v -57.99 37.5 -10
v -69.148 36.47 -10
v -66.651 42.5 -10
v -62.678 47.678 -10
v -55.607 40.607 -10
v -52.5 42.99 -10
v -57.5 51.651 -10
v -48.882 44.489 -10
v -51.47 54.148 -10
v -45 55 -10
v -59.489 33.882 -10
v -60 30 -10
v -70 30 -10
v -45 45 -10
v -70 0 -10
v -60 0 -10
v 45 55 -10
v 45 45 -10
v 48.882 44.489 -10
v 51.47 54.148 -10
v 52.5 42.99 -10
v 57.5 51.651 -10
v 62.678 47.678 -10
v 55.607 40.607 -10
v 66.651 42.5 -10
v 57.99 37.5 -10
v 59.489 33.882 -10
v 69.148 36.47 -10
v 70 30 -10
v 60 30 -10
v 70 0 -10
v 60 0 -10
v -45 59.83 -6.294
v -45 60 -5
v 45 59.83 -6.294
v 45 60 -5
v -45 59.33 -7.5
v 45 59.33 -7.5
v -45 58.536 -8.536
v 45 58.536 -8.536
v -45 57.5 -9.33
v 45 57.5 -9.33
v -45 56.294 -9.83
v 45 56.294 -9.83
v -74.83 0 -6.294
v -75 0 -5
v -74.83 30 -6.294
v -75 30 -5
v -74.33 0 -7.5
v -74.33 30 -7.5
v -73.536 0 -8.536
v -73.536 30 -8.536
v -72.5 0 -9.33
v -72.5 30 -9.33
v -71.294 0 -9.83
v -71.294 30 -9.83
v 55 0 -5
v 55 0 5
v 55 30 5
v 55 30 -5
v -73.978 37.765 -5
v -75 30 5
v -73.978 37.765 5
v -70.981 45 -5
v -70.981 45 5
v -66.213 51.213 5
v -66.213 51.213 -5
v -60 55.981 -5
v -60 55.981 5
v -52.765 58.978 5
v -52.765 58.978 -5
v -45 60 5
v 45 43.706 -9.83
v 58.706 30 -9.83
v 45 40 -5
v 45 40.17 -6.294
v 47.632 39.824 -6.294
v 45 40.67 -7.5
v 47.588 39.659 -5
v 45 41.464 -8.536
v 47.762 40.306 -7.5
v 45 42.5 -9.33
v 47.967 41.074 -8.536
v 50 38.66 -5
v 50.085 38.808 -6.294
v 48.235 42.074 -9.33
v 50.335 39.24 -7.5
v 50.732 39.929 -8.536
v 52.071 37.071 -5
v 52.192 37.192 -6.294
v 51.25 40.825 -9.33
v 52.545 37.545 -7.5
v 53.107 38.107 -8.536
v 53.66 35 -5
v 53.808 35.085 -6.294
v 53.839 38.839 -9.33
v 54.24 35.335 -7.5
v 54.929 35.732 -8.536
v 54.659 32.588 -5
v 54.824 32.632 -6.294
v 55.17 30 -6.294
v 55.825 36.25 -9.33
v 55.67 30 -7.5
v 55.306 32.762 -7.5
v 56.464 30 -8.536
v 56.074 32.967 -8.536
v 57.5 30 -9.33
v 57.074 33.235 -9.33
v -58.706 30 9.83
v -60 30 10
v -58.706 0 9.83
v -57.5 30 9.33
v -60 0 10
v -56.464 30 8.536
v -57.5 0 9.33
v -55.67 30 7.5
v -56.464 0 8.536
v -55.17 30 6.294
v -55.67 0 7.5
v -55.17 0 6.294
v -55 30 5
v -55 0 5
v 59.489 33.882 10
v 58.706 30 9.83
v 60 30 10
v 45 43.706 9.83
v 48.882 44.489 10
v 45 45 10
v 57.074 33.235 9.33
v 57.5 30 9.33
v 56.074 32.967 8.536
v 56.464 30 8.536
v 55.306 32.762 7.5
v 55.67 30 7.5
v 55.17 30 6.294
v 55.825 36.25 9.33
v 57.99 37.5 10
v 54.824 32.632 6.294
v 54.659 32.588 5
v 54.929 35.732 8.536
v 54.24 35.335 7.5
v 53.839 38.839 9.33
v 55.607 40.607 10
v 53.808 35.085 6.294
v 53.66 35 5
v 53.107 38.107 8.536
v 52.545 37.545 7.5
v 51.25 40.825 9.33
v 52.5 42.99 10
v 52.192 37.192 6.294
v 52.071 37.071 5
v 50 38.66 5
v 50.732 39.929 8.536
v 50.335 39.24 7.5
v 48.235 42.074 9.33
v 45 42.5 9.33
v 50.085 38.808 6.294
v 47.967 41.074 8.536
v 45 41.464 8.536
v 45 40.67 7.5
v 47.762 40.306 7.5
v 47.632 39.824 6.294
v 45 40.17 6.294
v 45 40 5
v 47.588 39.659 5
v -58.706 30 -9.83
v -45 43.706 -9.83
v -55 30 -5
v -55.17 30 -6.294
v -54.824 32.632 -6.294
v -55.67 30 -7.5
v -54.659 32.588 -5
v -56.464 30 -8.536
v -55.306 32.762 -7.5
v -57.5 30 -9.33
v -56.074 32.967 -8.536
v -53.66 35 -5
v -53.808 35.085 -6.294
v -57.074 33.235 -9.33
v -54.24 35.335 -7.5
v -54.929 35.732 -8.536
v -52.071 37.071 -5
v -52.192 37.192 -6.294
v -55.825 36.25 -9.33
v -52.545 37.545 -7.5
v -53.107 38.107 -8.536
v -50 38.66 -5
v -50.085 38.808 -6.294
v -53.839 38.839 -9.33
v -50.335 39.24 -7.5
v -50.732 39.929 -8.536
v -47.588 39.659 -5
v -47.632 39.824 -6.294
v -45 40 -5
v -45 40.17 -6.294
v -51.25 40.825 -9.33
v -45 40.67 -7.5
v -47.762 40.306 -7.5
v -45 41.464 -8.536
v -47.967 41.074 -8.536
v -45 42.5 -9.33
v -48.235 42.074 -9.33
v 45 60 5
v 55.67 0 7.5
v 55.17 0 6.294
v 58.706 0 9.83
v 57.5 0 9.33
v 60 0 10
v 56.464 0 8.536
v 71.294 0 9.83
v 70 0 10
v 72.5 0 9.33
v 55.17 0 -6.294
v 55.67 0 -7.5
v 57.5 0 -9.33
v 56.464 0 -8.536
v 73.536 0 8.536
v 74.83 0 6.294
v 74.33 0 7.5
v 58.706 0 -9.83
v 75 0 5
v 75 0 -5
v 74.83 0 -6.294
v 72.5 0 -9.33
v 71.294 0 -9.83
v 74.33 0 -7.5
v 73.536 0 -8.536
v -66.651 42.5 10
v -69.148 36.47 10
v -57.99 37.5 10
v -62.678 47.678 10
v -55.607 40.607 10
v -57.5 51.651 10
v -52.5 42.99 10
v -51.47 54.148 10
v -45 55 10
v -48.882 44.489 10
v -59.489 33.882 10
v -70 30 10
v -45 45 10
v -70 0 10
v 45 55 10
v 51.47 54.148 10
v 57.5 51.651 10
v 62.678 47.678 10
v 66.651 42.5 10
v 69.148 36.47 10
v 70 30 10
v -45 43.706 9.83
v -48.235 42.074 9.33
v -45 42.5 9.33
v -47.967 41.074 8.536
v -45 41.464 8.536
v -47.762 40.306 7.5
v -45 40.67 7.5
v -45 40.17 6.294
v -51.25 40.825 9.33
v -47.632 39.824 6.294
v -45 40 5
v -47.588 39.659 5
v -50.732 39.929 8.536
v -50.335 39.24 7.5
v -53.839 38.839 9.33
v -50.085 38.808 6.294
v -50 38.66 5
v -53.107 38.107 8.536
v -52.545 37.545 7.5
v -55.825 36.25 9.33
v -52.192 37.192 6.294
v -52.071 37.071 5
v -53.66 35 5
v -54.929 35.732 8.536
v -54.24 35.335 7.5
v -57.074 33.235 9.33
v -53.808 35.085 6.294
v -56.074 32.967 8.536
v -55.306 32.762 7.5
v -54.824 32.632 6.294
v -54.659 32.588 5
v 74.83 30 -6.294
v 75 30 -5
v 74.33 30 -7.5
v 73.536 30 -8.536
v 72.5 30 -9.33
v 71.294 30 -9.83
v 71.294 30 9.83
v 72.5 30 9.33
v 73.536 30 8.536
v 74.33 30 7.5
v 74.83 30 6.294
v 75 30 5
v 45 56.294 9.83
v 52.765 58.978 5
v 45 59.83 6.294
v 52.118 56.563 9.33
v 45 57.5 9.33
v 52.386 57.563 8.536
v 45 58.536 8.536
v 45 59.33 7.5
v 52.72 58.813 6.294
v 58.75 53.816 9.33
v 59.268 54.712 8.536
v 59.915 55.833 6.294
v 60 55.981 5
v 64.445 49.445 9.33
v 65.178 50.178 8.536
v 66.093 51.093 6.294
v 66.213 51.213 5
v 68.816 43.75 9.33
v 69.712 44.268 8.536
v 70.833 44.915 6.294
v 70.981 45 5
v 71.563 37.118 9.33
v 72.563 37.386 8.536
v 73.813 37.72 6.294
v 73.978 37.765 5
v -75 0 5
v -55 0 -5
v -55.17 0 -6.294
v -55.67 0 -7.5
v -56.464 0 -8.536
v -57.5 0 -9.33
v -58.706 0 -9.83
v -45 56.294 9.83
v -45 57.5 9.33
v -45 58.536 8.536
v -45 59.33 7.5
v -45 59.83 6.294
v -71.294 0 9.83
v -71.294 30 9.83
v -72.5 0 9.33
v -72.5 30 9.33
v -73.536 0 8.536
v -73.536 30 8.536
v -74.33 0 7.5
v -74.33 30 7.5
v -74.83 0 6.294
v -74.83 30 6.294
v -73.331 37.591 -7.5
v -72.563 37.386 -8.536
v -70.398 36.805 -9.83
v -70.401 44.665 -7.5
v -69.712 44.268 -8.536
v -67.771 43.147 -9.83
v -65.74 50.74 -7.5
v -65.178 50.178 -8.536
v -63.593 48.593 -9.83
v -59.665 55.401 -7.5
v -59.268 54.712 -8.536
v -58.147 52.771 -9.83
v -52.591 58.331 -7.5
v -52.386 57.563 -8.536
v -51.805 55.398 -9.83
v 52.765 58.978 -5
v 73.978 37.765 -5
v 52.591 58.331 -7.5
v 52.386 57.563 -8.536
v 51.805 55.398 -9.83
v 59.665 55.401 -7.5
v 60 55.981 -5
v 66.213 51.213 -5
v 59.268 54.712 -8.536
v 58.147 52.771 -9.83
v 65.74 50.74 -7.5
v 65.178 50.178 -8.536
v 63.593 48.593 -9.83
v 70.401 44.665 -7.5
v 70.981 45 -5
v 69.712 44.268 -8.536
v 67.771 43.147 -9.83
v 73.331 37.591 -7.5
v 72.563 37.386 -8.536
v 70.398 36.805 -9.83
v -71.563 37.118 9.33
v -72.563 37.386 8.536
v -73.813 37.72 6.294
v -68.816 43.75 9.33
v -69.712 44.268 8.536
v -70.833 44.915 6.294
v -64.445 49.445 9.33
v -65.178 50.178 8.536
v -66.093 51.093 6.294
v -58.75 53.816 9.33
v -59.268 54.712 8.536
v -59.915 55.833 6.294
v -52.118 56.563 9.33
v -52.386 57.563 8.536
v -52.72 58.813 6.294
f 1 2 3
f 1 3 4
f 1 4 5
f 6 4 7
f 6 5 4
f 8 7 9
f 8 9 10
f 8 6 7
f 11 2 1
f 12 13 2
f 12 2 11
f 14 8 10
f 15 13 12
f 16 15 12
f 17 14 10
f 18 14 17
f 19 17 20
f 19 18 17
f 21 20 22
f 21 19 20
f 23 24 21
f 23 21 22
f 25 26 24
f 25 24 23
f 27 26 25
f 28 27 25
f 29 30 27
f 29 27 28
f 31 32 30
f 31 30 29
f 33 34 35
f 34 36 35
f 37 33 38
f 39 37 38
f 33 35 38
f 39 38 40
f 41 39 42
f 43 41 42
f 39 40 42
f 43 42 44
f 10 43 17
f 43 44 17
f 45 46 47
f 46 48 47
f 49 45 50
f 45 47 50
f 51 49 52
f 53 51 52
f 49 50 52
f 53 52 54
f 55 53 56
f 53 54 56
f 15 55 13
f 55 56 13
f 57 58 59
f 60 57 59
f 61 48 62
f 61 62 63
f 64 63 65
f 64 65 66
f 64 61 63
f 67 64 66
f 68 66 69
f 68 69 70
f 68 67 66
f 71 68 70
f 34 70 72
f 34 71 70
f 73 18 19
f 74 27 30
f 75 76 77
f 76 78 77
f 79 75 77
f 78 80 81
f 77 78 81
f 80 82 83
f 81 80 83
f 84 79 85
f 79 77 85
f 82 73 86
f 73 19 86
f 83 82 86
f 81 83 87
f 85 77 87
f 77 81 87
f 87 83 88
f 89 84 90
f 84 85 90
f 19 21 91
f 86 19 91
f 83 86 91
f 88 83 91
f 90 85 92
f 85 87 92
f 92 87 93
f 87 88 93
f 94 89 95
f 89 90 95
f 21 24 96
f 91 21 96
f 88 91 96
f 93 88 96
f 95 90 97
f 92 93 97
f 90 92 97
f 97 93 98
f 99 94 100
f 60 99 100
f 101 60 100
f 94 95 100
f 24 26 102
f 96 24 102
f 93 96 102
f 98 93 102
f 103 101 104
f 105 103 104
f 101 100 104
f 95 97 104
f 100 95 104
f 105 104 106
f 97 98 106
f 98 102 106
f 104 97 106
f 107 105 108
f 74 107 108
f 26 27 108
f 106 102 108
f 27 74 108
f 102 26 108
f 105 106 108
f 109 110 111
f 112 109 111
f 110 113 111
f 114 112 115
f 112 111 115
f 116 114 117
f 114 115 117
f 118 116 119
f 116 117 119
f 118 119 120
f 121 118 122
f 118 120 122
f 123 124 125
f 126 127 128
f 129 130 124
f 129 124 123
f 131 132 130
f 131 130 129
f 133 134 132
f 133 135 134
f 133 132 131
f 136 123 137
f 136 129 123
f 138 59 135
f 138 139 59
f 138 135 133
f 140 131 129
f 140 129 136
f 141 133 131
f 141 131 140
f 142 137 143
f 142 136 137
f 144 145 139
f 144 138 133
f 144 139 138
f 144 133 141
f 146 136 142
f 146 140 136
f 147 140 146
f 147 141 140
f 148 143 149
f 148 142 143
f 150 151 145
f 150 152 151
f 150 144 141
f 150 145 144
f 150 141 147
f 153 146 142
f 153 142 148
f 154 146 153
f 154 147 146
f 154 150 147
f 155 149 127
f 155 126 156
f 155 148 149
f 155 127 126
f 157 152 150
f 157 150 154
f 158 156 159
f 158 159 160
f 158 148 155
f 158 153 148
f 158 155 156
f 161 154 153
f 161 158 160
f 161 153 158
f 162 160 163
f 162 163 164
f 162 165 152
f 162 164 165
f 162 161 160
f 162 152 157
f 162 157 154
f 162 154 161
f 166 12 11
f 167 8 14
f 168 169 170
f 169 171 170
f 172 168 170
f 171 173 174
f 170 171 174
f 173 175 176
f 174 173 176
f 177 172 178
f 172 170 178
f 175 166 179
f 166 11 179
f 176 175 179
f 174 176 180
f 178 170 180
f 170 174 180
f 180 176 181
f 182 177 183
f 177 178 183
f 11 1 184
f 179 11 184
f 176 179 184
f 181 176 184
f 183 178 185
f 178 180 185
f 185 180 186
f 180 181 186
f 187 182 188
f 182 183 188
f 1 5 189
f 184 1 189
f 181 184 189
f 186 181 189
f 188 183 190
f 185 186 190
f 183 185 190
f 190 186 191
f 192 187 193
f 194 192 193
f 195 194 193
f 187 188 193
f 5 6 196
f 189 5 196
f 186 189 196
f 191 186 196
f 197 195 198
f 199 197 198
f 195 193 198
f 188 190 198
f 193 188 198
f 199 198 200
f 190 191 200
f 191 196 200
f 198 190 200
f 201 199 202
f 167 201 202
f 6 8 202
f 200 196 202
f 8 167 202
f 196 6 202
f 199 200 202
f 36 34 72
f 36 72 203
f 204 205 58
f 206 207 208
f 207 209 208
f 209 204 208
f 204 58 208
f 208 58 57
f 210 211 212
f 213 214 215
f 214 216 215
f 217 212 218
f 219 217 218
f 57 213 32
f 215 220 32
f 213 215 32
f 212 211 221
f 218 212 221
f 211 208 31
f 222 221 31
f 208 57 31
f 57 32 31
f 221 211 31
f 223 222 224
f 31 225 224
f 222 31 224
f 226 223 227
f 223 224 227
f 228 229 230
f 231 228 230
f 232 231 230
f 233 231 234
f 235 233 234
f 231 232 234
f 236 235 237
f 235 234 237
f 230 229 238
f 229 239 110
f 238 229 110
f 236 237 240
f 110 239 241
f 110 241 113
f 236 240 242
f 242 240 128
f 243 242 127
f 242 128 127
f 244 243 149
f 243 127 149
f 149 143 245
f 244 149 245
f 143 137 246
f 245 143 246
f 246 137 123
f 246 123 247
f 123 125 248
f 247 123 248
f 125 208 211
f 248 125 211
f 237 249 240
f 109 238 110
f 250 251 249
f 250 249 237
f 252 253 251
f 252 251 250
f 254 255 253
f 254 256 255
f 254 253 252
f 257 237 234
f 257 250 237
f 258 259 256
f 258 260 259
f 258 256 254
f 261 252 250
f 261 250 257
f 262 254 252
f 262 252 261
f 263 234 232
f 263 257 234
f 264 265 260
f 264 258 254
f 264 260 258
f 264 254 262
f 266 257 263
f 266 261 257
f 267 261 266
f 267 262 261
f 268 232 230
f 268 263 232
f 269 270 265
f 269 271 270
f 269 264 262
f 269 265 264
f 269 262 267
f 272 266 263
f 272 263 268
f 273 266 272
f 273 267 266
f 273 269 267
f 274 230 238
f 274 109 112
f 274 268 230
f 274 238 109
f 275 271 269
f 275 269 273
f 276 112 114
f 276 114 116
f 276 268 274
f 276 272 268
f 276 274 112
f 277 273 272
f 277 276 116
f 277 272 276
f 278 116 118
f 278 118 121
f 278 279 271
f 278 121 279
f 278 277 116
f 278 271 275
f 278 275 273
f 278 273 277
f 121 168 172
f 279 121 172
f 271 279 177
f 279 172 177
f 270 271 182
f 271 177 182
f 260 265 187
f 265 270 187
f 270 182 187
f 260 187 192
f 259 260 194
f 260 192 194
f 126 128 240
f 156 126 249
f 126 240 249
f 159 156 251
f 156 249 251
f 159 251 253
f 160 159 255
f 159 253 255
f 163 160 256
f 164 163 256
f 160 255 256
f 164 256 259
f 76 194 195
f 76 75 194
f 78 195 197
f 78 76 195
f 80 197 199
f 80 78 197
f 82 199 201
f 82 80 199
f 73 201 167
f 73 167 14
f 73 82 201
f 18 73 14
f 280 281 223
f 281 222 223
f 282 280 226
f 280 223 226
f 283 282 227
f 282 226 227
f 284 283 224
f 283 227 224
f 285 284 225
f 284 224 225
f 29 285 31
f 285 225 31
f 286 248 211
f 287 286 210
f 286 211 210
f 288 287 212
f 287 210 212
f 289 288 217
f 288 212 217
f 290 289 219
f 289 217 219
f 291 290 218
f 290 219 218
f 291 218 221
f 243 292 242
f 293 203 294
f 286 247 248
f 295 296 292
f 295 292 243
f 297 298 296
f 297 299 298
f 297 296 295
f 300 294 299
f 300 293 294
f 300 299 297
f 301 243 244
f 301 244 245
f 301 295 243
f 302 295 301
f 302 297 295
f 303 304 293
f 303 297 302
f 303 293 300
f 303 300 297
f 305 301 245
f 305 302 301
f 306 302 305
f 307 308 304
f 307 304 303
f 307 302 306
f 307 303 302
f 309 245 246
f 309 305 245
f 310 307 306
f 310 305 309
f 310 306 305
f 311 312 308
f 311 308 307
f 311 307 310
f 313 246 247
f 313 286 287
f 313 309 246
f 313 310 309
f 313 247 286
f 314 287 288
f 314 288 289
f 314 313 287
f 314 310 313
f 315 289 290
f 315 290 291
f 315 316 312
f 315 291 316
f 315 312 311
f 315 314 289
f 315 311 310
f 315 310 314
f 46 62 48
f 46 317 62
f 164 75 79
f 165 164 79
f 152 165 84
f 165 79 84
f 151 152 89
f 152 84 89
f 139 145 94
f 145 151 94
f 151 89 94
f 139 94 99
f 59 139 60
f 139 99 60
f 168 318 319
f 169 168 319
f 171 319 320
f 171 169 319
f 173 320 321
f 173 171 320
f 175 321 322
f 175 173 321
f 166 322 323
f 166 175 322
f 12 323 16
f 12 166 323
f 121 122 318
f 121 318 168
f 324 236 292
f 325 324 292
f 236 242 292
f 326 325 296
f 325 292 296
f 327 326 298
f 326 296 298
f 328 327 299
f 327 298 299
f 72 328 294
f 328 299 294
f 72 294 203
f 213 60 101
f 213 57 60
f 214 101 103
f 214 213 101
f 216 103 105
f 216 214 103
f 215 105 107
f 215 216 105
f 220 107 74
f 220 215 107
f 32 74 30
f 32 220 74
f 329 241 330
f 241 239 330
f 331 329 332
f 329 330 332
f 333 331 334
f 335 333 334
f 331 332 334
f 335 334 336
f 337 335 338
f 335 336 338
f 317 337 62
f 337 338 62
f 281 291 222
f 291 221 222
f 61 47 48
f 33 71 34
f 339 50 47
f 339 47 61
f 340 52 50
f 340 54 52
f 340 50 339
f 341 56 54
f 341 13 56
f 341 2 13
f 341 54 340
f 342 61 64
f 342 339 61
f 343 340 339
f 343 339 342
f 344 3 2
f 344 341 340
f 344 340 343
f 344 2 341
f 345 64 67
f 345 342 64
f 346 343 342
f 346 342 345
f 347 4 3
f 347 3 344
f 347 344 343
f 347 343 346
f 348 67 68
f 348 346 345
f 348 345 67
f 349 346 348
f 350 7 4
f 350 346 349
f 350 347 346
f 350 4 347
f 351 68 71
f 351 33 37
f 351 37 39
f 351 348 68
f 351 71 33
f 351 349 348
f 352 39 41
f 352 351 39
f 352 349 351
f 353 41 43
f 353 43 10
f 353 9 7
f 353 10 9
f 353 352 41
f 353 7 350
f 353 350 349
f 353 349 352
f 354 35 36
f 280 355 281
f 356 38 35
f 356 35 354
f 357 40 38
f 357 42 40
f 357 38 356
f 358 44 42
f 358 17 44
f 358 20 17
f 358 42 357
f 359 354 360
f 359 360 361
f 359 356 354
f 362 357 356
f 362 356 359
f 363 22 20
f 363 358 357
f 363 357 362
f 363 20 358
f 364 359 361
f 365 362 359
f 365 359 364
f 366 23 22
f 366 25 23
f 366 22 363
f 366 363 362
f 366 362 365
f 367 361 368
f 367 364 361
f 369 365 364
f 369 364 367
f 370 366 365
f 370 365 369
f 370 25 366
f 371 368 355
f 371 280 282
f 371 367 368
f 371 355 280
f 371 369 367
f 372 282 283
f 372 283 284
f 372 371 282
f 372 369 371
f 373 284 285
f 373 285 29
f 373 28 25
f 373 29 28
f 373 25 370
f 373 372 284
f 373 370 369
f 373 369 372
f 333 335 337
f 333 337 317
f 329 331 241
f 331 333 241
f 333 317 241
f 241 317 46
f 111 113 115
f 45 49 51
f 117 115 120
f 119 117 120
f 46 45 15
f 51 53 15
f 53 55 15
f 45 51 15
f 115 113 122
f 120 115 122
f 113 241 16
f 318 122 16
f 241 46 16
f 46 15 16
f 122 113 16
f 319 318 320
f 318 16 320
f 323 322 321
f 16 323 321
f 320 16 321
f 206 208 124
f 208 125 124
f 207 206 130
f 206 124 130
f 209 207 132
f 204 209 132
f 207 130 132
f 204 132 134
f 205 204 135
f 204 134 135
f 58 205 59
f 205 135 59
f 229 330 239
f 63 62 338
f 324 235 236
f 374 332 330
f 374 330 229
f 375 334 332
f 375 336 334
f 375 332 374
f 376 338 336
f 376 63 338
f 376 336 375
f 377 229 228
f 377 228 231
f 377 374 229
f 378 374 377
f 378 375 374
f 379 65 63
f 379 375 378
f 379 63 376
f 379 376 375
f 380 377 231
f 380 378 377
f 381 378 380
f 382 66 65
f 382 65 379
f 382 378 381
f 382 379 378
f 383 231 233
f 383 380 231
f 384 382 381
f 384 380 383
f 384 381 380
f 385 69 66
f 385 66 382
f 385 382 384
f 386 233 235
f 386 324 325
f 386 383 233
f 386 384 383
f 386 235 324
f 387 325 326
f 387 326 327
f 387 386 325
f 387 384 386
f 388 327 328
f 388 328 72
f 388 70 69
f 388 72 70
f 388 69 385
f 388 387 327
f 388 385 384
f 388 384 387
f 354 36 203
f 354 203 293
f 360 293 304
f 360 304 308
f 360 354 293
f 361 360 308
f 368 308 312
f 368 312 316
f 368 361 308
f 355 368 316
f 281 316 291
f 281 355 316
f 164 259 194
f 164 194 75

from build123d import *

# Parameters (mm, degrees)
SKICA1_W                 = 150
SKICA1_H                 = 20
P_IDAT_VYSUNUT_M1_DEPTH  = 60
SKICA2_W                 = 110
SKICA2_H                 = 40
ODEBRAT_VYSUNUT_M1_DEPTH = 60
ZAOBLIT1_R               = 10
ZAOBLIT2_R               = 30
ZAOBLIT3_R               = 5


with BuildPart() as part:
    # Skica1 → Přidat vysunutím1 (new body)
    with BuildSketch(Plane(origin=(0, 0, 0), x_dir=(1, 0, 0), z_dir=(0, 1, 0))):
        Rectangle(SKICA1_W, SKICA1_H)
    extrude(amount=P_IDAT_VYSUNUT_M1_DEPTH)

    # Skica2 → Odebrat vysunutím1 (cut)
    with BuildSketch(Plane.XY.offset(10)):
        with Locations((0, 20)):
            Rectangle(SKICA2_W, SKICA2_H)
    extrude(amount=-ODEBRAT_VYSUNUT_M1_DEPTH, mode=Mode.SUBTRACT)

    # Zaoblit1
    zaoblit1_edges = [part.edges().sort_by_distance(p)[0] for p in [
        (-55, 40, 0),
        (55, 40, 0),
    ]]
    fillet(zaoblit1_edges, radius=ZAOBLIT1_R)

    # Zaoblit2
    zaoblit2_edges = [part.edges().sort_by_distance(p)[0] for p in [
        (75, 60, 0),
        (-75, 60, 0),
    ]]
    fillet(zaoblit2_edges, radius=ZAOBLIT2_R)

    # Zaoblit3
    zaoblit3_edges = [part.edges().sort_by_distance(p)[0] for p in [
        (55, 15, -10),
        (55, 15, 10),
        (0, 40, 10),
        (0, 40, -10),
        (-55, 15, 10),
        (-55, 15, -10),
        (52.071067812, 37.071067812, 10),
        (52.071067812, 37.071067812, -10),
        (-52.071067812, 37.071067812, 10),
        (-52.071067812, 37.071067812, -10),
        (0, 60, 10),
        (0, 60, -10),
        (-75, 15, -10),
        (75, 15, -10),
        (-66.213203436, 51.213203436, -10),
        (66.213203436, 51.213203436, -10),
        (75, 15, 10),
        (-75, 15, 10),
        (-66.213203436, 51.213203436, 10),
        (66.213203436, 51.213203436, 10),
    ]]
    fillet(zaoblit3_edges, radius=ZAOBLIT3_R)


solid = part.part
